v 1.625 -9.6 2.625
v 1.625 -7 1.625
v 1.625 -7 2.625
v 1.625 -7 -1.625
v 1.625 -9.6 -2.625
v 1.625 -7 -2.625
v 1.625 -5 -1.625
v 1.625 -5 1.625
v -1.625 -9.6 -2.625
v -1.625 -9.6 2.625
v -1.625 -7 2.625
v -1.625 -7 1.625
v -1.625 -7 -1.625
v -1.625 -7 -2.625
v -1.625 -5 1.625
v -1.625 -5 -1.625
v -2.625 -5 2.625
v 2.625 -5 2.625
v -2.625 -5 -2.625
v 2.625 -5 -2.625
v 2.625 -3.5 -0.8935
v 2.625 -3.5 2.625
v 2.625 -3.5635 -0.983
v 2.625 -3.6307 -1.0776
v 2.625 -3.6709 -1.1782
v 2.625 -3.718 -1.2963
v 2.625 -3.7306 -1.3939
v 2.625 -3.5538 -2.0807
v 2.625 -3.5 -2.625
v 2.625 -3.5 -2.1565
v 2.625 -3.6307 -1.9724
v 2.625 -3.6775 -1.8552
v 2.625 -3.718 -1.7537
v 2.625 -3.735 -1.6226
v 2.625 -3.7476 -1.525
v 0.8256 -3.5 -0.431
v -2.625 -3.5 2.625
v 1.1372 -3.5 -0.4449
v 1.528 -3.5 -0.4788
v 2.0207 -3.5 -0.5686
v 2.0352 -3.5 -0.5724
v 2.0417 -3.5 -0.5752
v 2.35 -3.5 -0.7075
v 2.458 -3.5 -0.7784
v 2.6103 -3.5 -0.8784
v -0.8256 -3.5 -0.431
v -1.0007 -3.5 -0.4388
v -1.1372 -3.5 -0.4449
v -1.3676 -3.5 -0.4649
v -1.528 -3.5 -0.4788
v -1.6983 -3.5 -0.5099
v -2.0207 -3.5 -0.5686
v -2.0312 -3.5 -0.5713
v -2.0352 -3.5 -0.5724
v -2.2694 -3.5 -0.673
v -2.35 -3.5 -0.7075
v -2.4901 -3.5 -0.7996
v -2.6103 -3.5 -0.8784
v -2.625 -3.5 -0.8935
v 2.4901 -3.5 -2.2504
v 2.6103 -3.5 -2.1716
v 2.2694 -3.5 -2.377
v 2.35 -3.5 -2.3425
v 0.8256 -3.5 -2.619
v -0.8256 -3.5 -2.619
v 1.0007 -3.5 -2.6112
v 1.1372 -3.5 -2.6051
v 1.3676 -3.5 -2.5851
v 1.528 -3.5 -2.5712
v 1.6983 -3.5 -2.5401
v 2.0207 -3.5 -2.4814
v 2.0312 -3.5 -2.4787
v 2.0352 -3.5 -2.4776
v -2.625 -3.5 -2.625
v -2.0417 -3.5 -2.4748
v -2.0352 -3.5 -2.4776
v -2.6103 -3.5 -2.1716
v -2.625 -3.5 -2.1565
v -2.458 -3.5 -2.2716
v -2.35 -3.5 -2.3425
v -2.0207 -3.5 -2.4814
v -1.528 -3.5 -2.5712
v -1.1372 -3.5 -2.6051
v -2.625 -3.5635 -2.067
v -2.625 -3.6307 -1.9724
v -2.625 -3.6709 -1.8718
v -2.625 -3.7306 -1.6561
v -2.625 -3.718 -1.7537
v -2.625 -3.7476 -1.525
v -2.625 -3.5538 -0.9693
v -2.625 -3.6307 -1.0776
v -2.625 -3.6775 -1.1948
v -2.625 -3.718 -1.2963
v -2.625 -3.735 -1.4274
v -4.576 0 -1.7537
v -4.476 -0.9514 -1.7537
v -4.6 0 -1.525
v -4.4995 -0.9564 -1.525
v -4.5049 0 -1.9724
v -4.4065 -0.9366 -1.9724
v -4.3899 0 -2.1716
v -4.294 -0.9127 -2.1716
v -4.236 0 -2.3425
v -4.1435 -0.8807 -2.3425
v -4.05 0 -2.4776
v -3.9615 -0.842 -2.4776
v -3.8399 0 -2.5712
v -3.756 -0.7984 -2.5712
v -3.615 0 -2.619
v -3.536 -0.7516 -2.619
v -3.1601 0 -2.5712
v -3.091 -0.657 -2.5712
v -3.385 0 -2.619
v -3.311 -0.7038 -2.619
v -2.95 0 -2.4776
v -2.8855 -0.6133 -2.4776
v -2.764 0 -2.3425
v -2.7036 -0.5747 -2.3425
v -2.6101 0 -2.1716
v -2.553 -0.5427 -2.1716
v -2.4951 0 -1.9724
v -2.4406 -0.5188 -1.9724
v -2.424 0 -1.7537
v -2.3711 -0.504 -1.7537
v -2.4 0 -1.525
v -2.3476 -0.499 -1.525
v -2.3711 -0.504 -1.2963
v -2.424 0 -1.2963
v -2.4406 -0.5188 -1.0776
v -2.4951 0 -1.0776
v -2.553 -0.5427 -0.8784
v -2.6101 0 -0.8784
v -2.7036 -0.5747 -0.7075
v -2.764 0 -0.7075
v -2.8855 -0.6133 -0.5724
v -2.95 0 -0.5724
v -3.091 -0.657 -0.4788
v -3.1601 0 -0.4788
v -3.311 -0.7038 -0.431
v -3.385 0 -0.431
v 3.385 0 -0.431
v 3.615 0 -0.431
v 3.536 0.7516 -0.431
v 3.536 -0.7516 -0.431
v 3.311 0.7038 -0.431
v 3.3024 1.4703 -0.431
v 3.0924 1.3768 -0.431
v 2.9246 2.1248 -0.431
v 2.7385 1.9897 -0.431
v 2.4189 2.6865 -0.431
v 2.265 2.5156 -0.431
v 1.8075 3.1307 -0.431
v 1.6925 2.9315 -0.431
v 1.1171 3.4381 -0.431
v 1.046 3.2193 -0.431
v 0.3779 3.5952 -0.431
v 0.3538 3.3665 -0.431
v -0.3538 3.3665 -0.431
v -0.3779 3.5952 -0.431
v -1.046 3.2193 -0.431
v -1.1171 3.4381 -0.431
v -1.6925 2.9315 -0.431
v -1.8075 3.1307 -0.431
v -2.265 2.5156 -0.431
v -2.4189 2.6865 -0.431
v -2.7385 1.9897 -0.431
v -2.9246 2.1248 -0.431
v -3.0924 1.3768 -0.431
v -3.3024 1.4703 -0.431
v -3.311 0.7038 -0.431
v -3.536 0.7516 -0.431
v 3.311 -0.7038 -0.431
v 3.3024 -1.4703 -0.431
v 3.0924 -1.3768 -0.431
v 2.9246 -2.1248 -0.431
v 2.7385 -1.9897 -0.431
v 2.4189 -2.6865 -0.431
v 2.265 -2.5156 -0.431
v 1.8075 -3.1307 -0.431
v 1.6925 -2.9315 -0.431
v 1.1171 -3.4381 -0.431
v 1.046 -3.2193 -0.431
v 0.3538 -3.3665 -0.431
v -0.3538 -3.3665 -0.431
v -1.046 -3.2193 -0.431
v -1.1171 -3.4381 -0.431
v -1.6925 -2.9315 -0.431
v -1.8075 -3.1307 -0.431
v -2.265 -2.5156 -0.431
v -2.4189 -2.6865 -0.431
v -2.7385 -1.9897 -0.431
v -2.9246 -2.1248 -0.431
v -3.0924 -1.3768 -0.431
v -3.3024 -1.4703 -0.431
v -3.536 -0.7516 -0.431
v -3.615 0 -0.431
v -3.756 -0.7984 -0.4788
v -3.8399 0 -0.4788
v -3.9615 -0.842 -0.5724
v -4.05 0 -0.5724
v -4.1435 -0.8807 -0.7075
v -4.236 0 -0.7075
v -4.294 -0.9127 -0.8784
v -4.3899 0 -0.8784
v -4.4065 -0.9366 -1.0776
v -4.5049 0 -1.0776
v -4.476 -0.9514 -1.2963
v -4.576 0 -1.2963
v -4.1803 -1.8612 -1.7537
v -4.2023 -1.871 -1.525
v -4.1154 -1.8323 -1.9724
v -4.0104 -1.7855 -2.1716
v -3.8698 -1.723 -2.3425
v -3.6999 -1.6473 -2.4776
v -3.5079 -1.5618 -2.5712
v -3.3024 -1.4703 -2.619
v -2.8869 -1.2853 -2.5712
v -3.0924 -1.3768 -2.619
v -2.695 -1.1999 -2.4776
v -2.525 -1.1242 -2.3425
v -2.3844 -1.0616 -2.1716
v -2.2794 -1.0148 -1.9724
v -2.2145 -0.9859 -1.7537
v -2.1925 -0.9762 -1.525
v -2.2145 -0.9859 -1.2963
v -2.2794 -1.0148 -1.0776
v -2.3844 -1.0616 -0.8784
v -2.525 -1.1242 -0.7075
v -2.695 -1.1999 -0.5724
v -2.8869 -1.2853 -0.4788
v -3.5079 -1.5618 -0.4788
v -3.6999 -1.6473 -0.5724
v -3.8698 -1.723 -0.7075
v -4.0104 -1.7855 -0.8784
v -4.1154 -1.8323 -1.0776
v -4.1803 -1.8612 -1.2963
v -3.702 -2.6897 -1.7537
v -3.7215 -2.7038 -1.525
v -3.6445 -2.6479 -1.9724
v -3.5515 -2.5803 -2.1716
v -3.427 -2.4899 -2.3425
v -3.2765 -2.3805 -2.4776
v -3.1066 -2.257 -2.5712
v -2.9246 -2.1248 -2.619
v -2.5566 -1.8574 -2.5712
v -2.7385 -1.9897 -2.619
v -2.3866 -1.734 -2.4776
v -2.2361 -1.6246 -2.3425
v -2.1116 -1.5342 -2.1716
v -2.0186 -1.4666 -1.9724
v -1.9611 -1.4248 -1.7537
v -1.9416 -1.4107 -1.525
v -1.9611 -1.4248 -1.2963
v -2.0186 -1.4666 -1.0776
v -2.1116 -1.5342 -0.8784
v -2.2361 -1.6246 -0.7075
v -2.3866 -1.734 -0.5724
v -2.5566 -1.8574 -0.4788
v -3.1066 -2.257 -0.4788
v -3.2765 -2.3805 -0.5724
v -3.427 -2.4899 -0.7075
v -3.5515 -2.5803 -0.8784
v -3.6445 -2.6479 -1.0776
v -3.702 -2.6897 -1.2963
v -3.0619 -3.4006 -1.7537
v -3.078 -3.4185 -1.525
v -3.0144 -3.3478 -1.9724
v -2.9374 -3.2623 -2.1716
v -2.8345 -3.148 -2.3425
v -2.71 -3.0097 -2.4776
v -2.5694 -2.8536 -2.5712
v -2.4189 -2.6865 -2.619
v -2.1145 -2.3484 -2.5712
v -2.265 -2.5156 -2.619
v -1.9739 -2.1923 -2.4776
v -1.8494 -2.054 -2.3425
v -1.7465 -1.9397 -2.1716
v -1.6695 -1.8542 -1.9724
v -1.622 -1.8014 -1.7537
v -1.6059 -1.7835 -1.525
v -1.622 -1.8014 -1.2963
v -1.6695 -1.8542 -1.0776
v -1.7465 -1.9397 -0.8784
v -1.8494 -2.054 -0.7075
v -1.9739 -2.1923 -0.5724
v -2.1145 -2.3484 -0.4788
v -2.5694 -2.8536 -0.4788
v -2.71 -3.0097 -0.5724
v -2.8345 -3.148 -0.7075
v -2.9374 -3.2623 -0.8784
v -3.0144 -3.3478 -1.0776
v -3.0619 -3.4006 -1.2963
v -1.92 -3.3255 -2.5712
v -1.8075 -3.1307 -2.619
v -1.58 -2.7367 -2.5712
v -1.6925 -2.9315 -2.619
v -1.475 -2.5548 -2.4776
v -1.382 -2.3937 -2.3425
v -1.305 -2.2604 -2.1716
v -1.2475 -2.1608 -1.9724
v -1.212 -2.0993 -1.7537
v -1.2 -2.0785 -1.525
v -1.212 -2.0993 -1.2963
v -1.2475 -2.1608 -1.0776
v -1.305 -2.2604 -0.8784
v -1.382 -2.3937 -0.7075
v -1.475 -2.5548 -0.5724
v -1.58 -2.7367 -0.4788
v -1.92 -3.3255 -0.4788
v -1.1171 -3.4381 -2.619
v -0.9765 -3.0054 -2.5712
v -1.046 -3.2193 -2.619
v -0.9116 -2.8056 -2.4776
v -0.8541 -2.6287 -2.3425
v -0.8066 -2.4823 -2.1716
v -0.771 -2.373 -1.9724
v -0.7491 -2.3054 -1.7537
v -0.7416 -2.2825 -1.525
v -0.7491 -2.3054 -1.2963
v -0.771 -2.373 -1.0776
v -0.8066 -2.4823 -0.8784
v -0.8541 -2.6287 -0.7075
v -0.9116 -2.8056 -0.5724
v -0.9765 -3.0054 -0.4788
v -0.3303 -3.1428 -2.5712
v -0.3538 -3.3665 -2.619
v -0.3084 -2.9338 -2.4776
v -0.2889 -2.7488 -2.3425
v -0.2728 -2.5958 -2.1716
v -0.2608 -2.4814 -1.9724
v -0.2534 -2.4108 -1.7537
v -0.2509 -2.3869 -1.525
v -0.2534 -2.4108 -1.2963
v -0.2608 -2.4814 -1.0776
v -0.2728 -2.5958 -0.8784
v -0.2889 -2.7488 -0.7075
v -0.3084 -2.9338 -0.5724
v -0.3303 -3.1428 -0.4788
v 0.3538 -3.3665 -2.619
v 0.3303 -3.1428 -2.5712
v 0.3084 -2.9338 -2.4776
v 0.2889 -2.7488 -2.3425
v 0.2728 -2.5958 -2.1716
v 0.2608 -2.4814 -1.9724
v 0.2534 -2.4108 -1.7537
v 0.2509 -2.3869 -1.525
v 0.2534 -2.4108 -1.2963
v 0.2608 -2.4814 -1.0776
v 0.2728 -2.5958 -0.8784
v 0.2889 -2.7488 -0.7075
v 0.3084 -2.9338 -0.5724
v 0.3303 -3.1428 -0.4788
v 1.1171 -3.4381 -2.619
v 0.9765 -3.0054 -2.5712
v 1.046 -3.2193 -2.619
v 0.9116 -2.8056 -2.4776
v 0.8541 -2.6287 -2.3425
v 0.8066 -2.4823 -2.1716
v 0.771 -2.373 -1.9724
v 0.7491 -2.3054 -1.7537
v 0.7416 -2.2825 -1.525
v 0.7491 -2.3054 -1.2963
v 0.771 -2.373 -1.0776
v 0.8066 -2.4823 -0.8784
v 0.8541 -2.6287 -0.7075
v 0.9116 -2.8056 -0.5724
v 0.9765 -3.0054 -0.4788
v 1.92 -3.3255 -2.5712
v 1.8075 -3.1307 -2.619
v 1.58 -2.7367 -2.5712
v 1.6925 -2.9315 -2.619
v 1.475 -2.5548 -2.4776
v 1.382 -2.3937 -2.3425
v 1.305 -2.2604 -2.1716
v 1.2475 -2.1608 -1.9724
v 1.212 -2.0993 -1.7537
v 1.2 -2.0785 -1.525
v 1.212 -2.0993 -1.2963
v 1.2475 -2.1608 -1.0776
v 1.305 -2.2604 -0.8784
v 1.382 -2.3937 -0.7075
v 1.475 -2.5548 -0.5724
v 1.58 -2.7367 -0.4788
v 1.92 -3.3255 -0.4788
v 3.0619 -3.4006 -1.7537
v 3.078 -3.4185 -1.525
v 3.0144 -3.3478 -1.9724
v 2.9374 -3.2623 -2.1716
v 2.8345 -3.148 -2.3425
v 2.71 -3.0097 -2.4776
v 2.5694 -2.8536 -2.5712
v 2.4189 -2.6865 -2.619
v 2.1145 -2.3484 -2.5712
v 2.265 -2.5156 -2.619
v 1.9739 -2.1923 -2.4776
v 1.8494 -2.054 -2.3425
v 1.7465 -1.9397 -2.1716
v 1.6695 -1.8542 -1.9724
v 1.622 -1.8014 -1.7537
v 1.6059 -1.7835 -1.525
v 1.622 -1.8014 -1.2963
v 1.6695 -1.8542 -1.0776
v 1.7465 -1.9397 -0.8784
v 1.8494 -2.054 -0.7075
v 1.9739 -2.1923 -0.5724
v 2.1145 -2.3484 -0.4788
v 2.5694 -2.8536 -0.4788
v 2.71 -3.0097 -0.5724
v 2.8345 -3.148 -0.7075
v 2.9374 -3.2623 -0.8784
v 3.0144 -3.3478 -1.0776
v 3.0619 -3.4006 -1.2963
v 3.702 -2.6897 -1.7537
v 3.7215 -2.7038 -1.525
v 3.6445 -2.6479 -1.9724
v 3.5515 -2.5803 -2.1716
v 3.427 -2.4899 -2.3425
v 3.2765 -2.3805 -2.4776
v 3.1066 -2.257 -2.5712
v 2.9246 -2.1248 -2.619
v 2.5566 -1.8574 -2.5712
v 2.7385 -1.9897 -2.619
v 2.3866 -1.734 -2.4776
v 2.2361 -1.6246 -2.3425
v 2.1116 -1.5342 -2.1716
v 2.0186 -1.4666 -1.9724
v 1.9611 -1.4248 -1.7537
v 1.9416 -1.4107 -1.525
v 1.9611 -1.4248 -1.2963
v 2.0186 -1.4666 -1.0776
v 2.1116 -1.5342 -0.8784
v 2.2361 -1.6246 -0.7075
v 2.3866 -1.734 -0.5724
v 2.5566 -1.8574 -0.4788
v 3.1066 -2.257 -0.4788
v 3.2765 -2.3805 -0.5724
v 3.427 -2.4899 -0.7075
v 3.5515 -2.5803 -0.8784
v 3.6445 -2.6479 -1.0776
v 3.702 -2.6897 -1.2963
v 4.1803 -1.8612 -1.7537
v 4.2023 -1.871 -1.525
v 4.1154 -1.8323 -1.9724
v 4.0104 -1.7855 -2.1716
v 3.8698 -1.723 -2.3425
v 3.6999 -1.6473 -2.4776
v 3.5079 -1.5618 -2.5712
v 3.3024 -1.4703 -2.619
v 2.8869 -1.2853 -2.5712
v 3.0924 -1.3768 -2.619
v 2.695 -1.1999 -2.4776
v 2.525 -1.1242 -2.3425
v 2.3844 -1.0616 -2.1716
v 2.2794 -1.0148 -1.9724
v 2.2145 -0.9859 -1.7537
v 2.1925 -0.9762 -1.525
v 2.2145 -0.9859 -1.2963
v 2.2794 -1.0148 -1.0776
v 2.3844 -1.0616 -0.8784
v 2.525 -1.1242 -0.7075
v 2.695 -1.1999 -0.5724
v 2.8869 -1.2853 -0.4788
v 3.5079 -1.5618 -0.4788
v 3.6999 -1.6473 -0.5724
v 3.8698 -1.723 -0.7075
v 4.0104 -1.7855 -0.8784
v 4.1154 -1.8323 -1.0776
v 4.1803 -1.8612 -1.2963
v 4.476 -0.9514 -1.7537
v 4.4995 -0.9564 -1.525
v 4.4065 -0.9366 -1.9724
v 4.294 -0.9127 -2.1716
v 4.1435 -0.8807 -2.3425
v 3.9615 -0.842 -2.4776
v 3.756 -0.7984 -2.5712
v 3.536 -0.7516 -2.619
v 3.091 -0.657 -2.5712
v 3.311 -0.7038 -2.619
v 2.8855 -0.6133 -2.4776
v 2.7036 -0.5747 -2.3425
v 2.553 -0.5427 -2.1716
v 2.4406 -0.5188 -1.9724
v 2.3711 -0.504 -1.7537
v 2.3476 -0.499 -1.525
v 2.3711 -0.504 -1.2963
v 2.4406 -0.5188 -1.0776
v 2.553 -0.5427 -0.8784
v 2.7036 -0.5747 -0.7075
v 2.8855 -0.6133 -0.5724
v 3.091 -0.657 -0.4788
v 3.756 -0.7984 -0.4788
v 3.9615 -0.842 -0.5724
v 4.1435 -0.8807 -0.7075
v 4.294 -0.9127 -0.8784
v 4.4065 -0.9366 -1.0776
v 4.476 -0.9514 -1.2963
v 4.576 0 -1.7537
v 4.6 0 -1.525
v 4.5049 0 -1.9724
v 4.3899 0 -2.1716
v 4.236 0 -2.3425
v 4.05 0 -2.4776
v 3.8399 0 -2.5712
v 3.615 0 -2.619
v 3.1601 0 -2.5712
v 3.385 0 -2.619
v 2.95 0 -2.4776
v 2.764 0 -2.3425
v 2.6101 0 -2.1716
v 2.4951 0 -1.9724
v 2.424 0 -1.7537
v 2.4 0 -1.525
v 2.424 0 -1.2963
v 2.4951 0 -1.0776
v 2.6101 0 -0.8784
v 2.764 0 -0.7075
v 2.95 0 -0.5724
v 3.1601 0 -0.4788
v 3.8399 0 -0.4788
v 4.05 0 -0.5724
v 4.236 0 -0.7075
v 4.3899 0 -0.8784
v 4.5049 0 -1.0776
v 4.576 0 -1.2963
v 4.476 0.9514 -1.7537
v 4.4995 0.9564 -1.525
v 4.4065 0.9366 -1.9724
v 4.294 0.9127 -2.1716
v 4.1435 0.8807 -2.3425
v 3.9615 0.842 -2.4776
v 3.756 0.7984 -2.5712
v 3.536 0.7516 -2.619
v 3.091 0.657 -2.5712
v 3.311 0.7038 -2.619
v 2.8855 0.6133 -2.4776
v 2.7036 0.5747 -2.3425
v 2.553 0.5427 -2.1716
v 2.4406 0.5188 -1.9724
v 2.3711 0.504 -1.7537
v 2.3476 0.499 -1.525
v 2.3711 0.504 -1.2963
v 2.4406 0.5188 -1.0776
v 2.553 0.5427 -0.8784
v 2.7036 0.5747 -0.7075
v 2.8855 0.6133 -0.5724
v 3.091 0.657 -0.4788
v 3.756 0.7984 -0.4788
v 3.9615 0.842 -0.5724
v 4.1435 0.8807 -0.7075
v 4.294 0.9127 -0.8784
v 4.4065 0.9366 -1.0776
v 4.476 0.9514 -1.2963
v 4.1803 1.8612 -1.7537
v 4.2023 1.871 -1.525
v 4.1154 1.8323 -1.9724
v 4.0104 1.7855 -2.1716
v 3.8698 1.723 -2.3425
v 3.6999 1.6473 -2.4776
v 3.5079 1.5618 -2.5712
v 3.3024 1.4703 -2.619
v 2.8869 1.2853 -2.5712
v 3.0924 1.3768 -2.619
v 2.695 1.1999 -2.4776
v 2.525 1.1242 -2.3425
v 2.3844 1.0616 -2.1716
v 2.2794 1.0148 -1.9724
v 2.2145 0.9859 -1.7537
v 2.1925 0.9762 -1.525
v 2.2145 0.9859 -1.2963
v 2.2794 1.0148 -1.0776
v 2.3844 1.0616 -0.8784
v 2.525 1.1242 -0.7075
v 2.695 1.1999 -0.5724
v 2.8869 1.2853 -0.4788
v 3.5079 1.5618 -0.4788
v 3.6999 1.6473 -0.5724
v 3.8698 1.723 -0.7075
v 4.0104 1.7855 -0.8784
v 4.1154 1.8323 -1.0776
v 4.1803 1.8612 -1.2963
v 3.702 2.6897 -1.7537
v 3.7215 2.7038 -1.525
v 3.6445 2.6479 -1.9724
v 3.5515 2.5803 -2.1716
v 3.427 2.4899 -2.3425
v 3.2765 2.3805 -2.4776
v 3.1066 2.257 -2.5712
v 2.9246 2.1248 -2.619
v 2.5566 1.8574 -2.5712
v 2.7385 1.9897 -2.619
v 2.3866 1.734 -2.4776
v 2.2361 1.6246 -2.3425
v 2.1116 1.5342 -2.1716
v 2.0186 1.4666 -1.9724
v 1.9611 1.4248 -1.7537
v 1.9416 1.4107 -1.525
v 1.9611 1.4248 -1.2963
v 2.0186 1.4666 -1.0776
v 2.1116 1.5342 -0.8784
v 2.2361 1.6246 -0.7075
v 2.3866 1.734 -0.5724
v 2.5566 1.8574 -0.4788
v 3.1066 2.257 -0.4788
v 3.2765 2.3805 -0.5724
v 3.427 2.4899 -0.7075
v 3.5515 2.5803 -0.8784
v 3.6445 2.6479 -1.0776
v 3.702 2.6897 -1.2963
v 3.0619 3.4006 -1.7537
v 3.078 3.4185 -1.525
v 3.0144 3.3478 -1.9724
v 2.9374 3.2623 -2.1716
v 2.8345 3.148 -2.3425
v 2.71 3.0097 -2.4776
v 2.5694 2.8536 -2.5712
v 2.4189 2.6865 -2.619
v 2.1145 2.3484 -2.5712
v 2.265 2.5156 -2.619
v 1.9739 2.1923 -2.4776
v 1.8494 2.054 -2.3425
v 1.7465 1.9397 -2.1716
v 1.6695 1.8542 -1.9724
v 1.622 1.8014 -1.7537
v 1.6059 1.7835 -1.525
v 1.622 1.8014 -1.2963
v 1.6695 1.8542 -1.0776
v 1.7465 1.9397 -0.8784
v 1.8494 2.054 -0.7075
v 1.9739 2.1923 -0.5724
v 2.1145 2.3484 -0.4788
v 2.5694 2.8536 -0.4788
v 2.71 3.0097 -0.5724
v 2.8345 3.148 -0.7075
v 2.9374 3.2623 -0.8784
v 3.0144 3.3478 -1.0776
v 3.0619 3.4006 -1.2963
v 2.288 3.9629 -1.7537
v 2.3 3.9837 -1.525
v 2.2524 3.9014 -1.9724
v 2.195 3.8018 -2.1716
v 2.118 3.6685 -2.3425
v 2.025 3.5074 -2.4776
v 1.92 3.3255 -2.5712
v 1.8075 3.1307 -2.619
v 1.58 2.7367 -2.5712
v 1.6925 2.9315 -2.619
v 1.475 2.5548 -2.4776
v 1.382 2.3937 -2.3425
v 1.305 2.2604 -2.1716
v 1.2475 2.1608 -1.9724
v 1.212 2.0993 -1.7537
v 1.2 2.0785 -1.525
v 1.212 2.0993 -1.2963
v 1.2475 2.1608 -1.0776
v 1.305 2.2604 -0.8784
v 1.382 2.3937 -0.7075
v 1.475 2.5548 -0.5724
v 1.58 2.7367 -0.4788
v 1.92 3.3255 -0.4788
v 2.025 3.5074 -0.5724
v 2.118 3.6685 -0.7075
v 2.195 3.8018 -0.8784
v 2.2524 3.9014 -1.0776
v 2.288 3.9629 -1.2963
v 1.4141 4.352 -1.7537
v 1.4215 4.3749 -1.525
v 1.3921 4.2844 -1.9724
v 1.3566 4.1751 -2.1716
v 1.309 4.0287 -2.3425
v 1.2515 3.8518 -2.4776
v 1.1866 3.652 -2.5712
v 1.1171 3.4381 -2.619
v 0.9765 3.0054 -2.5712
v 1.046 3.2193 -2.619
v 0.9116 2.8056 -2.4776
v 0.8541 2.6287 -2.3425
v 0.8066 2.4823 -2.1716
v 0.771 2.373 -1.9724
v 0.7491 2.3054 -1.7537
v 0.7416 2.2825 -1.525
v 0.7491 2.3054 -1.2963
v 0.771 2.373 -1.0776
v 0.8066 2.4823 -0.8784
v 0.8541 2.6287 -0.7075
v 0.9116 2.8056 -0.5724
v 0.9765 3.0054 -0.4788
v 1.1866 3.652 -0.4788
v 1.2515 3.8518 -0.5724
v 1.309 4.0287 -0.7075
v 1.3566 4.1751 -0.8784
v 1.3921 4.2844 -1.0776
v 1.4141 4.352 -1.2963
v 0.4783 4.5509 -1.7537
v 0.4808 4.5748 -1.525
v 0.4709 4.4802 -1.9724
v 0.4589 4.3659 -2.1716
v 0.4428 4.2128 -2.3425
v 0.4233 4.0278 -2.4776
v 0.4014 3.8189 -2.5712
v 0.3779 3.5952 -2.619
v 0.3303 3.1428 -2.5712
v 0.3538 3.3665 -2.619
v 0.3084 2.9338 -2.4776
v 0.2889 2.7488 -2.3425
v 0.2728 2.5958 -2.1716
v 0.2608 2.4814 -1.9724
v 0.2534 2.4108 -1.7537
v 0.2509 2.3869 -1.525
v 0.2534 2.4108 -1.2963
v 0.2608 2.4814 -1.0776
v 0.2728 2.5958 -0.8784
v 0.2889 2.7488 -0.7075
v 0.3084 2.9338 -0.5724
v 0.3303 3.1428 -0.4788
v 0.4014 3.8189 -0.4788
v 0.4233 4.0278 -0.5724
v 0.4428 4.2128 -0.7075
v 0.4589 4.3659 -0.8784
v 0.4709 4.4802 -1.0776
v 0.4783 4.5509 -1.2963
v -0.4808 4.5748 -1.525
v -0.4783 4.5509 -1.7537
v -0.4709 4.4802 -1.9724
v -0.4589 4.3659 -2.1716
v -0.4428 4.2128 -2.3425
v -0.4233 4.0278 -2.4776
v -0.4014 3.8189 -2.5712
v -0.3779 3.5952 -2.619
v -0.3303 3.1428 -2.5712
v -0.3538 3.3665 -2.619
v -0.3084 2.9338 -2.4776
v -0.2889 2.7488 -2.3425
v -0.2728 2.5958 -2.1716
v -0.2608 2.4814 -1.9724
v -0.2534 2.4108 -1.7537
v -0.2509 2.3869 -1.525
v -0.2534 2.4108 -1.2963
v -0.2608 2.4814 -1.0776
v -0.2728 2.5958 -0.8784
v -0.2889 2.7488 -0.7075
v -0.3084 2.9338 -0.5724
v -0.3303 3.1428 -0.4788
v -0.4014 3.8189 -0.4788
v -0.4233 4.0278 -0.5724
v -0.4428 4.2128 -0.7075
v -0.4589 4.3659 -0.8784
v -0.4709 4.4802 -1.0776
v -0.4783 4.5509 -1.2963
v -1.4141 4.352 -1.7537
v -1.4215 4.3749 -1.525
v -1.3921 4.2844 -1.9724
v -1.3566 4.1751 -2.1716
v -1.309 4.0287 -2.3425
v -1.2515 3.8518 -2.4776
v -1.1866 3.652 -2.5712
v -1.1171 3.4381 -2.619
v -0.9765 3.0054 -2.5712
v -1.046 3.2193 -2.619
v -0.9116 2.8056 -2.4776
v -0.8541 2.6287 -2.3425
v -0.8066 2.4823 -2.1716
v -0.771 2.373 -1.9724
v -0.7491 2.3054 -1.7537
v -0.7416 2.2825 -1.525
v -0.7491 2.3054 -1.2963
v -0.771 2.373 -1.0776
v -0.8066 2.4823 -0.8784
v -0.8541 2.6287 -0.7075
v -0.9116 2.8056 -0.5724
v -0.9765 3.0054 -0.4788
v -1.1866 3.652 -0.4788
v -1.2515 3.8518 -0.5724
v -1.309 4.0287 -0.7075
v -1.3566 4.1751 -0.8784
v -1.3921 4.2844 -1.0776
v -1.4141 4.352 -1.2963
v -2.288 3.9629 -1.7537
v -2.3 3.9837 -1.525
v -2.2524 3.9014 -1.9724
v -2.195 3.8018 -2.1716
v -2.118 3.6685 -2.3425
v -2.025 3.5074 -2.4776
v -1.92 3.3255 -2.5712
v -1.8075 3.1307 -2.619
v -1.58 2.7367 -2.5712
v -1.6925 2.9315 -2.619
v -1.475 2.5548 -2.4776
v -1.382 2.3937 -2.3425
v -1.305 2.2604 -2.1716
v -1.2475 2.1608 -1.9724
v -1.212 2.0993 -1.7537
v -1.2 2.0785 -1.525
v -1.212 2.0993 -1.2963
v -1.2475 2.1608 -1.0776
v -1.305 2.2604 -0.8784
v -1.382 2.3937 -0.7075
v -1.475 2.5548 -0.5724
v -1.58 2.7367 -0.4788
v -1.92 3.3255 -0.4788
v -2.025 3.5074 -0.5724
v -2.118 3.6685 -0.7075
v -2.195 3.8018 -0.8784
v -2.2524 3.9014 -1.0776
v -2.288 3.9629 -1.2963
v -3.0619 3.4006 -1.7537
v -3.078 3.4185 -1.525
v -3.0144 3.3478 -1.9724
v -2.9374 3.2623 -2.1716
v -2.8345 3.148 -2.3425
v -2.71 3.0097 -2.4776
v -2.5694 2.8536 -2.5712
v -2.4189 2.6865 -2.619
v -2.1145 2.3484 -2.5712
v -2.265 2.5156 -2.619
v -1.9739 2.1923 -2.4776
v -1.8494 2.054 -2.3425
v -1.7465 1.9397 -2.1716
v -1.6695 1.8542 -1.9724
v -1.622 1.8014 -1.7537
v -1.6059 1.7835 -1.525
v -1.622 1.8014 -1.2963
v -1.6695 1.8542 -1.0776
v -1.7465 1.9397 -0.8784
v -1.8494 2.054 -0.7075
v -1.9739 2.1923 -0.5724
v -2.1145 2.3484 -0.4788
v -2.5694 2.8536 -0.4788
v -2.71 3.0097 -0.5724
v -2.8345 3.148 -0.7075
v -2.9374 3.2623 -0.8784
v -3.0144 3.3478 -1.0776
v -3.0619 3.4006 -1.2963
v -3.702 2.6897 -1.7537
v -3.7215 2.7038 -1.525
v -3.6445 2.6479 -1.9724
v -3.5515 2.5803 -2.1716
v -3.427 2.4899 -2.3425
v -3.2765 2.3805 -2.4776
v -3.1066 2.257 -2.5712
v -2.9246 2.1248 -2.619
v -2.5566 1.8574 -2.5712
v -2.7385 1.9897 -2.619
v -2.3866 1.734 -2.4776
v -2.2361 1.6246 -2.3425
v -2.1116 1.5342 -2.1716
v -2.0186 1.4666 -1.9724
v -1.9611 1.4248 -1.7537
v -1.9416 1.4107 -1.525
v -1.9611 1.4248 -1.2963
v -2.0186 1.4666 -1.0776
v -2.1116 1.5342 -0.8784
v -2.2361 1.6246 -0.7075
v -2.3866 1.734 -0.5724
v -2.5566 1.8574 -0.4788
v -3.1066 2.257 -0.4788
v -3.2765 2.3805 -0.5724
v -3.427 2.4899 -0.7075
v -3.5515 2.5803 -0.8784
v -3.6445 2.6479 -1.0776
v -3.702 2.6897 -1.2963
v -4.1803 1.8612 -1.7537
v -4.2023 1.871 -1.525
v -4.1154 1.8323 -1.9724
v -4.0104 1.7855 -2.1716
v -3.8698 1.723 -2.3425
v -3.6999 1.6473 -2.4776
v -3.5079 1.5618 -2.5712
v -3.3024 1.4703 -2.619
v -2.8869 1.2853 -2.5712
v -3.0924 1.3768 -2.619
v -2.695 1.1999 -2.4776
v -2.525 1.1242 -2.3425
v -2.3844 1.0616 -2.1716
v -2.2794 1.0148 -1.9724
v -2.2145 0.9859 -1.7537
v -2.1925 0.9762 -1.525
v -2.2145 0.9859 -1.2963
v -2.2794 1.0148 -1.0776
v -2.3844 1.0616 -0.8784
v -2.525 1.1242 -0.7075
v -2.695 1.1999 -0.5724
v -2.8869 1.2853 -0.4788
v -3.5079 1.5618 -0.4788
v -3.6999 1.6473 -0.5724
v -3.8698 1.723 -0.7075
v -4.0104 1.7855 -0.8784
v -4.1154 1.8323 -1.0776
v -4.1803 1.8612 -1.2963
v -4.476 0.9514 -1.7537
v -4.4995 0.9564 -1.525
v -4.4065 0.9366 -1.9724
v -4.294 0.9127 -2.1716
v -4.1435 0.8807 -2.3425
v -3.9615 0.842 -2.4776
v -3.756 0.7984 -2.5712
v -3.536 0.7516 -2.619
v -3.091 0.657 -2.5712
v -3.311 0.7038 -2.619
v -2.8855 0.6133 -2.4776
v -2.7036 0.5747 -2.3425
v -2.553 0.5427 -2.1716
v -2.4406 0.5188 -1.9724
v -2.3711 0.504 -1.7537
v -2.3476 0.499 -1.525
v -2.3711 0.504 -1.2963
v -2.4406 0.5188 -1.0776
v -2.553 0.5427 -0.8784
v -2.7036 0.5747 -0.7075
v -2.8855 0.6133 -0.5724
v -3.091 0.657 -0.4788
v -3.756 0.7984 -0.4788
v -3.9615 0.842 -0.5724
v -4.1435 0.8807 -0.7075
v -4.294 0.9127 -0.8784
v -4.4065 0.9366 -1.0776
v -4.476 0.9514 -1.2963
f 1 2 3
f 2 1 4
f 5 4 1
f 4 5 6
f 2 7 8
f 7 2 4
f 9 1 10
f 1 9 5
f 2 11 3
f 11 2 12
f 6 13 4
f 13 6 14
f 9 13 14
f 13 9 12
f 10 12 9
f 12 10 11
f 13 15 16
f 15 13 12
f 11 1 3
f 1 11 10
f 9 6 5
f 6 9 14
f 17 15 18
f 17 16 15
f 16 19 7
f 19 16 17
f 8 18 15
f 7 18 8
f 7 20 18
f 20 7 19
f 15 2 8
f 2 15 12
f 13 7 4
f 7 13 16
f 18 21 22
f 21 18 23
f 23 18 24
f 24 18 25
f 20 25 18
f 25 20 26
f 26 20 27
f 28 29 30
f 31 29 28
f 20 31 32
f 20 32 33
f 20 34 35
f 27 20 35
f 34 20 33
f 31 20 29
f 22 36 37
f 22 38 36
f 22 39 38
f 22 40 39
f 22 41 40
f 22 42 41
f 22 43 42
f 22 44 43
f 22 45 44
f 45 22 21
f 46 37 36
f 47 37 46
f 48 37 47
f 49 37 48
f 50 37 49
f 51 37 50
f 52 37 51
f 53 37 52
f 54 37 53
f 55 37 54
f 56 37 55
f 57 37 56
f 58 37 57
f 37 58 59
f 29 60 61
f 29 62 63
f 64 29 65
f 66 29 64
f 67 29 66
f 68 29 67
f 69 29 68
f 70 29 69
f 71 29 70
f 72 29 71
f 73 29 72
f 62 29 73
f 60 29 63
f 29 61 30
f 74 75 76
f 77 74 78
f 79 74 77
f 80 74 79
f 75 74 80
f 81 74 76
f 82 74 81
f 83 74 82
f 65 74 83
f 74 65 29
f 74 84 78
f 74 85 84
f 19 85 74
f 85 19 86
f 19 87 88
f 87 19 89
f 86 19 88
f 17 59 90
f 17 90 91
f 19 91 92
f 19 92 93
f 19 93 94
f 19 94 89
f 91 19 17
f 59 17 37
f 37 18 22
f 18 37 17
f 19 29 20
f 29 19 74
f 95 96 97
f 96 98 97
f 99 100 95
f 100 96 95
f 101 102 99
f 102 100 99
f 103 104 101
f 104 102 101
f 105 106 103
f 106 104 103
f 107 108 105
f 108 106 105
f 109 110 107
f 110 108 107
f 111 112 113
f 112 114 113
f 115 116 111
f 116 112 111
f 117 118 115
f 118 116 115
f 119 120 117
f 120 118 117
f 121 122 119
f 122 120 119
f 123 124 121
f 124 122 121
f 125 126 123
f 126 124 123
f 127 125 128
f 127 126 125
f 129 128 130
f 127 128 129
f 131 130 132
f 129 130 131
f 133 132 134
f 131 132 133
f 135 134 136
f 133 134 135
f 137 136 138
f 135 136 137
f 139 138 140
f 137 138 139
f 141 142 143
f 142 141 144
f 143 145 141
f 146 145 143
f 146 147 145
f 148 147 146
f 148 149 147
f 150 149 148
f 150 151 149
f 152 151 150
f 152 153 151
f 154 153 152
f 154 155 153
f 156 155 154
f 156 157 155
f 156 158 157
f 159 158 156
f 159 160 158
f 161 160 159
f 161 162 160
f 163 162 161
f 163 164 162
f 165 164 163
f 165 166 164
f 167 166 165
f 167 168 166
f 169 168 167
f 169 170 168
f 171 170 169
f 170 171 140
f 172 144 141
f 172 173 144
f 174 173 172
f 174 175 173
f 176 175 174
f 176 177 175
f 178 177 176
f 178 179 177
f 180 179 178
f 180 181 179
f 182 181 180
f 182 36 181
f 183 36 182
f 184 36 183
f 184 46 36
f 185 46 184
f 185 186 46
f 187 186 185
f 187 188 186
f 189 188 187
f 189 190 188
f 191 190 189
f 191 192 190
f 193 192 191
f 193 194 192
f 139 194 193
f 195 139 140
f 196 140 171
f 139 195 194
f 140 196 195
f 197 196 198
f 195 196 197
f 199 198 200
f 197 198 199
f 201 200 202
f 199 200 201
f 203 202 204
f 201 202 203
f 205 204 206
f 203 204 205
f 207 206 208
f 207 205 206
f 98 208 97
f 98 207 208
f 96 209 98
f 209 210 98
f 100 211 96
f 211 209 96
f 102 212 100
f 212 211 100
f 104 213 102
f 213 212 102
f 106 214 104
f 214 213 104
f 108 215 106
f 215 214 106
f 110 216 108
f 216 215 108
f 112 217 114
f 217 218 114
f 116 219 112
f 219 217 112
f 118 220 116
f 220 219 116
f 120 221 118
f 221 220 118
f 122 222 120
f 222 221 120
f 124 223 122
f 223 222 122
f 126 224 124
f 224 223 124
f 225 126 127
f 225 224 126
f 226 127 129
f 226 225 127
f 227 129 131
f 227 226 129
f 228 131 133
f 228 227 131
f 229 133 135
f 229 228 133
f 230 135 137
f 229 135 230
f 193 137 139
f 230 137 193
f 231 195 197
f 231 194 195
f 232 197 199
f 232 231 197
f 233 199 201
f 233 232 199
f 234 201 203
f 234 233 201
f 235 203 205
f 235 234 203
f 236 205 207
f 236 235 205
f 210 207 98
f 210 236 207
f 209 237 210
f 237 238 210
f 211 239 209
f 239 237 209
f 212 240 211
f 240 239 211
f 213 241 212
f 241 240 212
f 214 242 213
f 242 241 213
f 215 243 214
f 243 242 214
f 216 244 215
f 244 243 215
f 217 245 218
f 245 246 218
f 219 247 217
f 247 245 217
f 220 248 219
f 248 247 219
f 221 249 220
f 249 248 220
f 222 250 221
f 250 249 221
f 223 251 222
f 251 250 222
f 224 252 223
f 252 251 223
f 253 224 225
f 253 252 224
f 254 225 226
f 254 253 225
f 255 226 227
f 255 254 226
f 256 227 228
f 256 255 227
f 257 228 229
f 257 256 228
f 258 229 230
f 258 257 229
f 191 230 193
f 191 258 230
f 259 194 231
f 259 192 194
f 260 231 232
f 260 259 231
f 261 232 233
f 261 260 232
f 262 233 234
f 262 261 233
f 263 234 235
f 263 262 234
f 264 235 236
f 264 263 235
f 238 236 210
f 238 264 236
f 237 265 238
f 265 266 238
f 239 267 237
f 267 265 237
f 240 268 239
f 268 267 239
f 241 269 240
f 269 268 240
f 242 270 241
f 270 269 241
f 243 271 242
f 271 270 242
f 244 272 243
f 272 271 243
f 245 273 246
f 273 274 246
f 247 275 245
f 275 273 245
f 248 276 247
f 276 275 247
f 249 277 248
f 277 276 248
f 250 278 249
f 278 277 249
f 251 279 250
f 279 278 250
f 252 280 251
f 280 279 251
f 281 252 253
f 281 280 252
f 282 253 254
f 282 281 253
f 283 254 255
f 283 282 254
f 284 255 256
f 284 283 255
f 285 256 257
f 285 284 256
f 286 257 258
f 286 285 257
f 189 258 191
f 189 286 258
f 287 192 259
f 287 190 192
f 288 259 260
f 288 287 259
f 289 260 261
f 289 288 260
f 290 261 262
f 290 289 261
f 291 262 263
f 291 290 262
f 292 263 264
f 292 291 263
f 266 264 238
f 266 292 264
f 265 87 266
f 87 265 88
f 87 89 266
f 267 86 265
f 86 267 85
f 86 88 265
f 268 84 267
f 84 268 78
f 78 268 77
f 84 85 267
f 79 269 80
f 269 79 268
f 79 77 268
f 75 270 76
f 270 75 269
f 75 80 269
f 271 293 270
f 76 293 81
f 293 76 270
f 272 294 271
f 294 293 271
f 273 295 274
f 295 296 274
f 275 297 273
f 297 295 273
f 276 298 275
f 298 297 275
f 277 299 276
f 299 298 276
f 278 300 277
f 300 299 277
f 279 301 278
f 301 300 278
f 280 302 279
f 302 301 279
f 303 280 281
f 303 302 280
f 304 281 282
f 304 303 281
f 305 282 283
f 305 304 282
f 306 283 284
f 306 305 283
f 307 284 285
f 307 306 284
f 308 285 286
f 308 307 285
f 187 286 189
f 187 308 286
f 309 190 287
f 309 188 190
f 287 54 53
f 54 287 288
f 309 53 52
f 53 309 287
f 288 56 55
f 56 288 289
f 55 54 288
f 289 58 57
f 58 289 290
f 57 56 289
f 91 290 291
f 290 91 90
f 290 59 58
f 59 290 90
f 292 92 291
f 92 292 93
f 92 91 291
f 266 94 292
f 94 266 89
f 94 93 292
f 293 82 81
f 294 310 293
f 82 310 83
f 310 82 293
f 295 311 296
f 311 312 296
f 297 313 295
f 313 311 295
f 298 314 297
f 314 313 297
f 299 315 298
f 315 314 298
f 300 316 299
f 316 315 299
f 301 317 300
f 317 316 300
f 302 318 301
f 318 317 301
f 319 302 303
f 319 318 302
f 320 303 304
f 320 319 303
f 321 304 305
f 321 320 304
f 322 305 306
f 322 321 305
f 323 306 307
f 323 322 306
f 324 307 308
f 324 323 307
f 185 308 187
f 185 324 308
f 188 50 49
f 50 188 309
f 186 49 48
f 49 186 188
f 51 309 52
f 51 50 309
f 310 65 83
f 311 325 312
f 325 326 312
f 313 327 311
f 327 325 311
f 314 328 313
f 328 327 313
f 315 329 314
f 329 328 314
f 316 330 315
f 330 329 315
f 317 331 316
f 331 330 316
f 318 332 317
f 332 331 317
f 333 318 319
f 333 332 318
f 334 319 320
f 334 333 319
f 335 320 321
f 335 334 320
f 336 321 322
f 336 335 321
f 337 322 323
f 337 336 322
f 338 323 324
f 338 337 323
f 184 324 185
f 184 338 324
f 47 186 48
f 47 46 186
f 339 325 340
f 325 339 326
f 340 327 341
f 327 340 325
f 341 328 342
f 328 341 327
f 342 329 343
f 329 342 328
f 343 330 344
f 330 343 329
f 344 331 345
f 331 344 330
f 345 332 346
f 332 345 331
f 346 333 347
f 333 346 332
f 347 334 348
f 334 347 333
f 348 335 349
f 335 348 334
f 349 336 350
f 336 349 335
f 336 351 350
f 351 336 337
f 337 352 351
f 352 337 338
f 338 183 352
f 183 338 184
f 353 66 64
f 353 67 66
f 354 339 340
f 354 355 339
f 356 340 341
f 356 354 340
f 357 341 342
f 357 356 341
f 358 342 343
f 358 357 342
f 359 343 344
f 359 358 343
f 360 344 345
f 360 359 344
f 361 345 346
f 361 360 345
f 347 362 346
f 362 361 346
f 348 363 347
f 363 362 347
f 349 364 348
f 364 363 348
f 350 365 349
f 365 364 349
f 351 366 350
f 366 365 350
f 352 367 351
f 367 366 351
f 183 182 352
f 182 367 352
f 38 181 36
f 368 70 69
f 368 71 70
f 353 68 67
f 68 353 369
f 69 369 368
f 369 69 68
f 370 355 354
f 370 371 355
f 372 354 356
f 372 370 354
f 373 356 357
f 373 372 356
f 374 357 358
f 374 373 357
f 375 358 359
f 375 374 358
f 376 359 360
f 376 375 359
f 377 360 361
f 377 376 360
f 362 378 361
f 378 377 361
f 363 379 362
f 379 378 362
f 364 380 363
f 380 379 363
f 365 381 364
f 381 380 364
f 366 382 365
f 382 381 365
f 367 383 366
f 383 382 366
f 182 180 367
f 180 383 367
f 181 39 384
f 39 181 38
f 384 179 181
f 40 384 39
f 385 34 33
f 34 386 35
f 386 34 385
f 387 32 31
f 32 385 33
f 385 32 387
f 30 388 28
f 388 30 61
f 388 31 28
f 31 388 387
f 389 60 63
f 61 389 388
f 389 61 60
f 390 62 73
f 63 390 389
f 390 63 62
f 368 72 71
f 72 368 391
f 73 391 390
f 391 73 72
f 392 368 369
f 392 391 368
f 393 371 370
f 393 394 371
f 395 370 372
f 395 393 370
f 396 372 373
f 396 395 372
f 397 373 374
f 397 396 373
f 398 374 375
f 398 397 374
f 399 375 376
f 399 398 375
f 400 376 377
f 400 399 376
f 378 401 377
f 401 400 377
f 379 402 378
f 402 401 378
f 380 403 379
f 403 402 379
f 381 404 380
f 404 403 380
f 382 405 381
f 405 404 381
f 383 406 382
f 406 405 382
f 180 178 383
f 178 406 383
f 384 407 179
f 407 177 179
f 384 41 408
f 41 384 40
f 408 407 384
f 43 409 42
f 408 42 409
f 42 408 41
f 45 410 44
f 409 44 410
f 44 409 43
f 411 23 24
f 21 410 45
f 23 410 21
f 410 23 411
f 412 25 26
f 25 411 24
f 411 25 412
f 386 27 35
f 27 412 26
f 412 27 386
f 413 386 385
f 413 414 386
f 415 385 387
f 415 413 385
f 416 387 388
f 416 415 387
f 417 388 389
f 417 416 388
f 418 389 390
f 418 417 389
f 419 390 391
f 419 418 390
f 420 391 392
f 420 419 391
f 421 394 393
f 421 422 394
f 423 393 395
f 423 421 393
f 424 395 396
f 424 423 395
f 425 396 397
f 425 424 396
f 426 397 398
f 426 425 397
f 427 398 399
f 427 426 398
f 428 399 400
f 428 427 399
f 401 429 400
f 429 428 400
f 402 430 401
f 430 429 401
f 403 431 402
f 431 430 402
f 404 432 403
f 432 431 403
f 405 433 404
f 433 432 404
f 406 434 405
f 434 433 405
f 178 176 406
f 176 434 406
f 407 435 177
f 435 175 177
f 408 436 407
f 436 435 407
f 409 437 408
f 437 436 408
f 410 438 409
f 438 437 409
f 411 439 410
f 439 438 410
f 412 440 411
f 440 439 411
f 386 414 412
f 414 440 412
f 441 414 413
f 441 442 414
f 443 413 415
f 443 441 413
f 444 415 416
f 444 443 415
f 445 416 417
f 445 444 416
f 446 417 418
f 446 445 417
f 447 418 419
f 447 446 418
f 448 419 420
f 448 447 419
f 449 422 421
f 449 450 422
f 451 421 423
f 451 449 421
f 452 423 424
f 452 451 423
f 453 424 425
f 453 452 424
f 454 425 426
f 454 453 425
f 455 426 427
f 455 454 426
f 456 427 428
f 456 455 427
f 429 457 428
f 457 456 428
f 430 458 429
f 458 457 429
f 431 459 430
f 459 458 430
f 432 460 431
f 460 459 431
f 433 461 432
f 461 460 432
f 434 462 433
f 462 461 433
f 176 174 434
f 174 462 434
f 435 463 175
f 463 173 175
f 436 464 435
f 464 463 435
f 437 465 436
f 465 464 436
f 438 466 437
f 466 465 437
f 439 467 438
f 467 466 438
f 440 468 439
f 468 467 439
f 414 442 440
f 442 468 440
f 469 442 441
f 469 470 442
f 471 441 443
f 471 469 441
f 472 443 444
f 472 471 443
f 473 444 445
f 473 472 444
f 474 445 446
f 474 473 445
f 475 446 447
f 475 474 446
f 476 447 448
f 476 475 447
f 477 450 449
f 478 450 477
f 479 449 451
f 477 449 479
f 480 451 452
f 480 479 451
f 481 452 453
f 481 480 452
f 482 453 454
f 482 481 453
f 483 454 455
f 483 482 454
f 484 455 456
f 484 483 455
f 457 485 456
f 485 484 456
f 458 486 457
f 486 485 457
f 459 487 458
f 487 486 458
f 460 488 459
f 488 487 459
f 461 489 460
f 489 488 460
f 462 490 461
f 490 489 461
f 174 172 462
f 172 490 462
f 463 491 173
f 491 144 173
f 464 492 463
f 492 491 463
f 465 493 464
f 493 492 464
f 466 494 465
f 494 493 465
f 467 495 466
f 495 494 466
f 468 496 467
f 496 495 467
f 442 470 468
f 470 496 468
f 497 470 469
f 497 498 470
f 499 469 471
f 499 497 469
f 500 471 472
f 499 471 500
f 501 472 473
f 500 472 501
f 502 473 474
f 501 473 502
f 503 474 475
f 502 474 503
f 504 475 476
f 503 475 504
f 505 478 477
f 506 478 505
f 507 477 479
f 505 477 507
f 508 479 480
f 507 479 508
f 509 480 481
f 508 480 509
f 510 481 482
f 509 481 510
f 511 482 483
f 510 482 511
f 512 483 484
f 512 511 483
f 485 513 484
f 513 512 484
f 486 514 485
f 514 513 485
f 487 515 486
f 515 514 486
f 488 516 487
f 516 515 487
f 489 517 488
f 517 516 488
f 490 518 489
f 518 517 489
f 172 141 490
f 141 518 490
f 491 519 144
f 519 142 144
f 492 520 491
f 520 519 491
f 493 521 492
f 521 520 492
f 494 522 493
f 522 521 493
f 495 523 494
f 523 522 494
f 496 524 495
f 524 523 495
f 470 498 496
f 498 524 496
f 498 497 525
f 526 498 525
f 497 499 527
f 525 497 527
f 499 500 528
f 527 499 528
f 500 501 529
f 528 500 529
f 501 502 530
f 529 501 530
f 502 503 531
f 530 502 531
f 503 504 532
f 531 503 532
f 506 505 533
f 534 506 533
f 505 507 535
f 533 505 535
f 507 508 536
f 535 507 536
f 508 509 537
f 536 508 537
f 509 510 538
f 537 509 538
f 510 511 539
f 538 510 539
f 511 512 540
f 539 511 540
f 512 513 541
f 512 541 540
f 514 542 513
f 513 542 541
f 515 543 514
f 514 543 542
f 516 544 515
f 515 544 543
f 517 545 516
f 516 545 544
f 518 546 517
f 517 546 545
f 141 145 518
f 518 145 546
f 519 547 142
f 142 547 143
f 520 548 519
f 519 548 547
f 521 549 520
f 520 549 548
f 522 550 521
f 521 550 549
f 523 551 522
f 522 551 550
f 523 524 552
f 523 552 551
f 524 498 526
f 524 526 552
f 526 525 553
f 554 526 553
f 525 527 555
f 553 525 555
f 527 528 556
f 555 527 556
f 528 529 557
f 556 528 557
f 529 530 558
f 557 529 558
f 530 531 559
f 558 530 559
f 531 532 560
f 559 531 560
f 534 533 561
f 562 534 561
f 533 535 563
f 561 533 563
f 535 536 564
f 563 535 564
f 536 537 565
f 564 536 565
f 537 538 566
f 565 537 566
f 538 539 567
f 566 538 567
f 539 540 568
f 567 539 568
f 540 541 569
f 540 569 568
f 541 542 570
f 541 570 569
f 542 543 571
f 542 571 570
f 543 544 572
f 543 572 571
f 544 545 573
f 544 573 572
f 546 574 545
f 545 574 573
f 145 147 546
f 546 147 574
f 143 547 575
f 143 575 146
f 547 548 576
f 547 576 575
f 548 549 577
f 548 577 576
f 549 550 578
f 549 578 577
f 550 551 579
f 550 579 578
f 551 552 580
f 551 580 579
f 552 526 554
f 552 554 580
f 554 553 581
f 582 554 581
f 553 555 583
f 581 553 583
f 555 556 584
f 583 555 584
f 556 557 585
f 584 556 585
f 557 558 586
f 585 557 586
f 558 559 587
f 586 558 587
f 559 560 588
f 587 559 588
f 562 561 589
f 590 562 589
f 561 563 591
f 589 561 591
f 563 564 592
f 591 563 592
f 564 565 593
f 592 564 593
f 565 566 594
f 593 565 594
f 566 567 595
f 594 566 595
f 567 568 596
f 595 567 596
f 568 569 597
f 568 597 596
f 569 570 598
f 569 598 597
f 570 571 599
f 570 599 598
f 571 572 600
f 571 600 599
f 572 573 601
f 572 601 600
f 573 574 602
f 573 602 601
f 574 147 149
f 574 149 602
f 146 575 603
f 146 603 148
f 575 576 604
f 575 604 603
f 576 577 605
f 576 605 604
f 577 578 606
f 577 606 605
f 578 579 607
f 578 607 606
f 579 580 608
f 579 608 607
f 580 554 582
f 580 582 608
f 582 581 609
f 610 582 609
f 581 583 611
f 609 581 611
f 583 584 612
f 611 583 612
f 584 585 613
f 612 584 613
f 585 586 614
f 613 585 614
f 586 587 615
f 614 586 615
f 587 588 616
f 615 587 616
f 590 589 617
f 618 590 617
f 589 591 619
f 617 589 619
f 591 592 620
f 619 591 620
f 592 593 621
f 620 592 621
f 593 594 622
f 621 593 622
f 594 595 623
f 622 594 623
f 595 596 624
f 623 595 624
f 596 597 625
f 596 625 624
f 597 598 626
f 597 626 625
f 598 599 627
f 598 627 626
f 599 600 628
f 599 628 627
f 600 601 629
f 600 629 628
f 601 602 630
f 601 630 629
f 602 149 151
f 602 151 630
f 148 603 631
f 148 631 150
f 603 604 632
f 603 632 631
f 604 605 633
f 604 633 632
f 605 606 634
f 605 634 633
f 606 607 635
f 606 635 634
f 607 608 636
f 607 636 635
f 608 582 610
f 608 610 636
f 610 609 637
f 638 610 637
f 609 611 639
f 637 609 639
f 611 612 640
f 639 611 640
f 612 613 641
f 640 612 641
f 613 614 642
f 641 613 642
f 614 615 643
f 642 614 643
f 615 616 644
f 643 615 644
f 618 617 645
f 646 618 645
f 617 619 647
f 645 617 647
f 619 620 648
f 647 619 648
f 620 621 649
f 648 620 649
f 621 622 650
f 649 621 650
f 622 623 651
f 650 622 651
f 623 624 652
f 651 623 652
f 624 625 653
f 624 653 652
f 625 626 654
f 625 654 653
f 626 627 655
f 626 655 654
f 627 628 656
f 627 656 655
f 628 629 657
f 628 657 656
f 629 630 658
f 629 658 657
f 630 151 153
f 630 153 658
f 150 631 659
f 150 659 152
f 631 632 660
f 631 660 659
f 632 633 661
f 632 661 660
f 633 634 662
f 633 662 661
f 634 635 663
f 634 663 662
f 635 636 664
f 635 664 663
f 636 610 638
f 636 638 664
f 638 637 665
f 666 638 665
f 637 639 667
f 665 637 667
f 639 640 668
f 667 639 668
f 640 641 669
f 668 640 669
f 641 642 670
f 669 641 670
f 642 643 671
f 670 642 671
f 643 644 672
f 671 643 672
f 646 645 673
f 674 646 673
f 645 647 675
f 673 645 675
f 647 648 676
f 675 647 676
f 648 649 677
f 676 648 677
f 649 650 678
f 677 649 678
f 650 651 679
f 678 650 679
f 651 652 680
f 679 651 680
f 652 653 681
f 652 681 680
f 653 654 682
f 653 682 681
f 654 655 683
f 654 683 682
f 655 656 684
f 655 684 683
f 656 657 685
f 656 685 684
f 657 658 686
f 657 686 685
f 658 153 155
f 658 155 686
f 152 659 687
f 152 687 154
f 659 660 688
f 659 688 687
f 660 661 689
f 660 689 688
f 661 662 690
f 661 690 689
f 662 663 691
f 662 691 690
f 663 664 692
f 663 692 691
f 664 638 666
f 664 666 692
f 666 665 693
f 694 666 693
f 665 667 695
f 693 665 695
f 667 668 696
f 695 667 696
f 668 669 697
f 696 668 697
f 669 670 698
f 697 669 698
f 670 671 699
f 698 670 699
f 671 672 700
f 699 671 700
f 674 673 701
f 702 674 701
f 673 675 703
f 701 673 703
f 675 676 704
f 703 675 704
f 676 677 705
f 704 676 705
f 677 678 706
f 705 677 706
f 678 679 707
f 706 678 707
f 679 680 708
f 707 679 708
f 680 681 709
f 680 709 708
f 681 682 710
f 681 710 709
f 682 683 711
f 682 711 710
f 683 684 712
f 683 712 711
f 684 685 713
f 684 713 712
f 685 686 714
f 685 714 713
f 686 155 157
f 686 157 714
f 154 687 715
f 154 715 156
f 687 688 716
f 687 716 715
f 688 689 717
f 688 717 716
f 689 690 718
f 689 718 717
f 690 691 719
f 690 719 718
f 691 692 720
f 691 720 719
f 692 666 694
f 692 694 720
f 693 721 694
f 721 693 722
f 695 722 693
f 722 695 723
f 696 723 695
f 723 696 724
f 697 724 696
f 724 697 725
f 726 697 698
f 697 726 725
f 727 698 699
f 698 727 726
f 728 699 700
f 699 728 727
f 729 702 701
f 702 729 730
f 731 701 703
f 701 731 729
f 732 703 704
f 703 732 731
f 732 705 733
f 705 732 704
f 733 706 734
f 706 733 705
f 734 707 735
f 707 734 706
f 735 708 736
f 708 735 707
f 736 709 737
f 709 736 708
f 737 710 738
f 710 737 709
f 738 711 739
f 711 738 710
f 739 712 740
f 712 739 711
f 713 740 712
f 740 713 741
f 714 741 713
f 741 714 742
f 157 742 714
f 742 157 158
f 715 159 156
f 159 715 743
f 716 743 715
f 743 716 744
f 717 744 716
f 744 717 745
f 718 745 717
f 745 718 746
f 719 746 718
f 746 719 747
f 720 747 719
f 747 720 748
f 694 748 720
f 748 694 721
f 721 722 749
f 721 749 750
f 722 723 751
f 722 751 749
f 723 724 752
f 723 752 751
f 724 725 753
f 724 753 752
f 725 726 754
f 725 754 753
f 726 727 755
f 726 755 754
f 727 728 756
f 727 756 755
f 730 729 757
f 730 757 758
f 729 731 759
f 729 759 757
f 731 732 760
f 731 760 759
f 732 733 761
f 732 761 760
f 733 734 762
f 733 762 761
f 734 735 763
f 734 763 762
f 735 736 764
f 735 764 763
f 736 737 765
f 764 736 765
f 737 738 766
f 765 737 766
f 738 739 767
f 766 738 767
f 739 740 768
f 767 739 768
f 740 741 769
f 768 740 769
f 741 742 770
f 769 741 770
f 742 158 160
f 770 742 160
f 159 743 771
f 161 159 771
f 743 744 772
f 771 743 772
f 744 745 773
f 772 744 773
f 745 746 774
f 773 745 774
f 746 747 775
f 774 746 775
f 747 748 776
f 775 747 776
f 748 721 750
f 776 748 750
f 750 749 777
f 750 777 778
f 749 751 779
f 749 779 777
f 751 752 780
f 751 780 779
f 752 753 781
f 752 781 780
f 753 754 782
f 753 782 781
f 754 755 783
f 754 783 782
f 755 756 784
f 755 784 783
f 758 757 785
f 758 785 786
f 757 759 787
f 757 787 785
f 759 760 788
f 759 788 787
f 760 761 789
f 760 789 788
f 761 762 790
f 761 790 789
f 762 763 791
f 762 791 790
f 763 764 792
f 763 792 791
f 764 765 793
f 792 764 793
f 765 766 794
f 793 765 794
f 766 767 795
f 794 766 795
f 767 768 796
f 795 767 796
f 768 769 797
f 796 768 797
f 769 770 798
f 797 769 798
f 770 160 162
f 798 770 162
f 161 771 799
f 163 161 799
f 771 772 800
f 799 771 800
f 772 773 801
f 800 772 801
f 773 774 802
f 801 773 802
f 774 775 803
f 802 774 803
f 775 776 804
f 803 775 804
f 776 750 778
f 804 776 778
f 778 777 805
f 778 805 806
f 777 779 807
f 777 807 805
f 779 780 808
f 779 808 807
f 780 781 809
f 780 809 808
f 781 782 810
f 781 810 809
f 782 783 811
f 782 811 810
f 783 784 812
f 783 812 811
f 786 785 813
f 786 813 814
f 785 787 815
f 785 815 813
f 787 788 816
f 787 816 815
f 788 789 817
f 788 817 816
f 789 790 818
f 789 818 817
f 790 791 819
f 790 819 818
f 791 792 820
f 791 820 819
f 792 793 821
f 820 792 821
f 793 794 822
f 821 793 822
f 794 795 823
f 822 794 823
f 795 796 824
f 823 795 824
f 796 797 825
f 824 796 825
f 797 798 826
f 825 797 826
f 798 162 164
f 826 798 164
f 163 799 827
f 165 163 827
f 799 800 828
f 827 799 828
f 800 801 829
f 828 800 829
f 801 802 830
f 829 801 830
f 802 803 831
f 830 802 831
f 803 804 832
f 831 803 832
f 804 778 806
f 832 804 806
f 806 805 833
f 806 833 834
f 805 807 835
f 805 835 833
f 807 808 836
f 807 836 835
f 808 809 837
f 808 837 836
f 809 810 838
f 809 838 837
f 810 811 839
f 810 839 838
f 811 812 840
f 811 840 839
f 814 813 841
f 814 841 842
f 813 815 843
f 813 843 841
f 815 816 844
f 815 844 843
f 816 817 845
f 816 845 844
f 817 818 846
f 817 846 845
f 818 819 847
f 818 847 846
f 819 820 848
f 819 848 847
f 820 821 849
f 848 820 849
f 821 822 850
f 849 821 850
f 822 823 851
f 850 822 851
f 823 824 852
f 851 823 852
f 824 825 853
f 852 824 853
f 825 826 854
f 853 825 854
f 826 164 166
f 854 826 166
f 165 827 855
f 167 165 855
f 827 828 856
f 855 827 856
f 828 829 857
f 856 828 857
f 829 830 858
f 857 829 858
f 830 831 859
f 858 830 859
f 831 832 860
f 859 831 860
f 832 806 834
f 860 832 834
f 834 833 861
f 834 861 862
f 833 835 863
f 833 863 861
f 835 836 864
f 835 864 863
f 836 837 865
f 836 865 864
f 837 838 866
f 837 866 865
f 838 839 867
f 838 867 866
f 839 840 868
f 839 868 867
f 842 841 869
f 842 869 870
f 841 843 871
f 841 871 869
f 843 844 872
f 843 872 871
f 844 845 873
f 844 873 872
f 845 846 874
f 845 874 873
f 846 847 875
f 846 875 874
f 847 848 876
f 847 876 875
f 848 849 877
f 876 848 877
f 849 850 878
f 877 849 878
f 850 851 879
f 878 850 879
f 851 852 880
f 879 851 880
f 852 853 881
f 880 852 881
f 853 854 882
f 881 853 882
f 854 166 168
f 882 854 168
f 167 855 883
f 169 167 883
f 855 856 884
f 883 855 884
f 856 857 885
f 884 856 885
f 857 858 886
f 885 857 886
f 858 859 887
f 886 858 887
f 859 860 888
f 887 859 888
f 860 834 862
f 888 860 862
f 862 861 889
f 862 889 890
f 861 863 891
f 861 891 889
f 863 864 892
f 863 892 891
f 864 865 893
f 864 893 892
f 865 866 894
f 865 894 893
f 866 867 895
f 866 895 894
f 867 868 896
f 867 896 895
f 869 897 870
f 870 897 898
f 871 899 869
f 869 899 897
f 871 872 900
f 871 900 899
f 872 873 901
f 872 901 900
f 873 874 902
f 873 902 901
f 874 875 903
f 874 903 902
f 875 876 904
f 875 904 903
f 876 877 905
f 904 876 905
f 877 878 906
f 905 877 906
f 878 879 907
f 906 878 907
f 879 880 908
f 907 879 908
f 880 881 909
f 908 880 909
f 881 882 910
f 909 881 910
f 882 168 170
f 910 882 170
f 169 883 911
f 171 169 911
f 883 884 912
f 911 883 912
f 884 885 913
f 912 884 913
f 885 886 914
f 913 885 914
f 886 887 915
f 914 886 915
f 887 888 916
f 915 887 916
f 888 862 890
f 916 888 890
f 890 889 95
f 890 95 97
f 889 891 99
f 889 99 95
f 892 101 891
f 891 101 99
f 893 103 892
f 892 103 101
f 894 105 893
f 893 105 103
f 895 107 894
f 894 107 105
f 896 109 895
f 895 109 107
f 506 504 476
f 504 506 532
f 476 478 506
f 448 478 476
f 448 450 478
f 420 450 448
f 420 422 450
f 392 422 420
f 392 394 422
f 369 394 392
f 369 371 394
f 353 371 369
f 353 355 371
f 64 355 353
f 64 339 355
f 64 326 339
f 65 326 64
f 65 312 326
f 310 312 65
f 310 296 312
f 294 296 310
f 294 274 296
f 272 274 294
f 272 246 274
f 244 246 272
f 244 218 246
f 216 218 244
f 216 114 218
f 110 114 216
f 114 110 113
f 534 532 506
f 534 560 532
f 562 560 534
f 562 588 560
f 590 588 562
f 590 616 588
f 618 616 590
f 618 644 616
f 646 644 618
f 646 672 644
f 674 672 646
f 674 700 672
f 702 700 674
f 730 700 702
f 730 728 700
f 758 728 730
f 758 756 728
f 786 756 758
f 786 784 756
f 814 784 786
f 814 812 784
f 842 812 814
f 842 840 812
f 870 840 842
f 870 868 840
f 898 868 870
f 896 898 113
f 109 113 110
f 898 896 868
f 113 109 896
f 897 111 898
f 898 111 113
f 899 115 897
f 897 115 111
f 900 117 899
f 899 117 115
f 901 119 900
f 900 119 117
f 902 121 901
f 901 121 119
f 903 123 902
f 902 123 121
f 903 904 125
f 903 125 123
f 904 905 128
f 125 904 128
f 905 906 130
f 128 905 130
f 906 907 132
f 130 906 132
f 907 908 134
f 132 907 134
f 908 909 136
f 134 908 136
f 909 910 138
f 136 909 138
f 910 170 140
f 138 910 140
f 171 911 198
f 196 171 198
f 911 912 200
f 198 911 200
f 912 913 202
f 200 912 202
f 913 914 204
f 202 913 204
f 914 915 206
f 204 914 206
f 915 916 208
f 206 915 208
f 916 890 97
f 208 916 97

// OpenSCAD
narrow_width = 3.25;
narrow_height = 2;
wide_width = 5.25;
wide_height = 2.6;
circle_radius = 3.5;
circle_offset = 1.5;
circle_thickness = 2.2;
$fs = 0.05;

rotate([90, 0, 0]) {
	translate([-narrow_width / 2, -wide_width / 2, narrow_height + circle_radius + circle_offset]) cube([narrow_width, wide_width, wide_height]);
	translate([-narrow_width / 2, -narrow_width / 2, circle_radius + circle_offset]) cube([narrow_width, narrow_width, narrow_height]);
	translate([-wide_width / 2, -wide_width / 2, circle_radius]) cube([wide_width, wide_width, circle_offset]);
	translate([0, -wide_width / 2 + circle_thickness / 2, 0]) rotate([90, 0, 0]) rotate_extrude() translate([circle_radius, 0, 0]) circle(d = circle_thickness);
}
